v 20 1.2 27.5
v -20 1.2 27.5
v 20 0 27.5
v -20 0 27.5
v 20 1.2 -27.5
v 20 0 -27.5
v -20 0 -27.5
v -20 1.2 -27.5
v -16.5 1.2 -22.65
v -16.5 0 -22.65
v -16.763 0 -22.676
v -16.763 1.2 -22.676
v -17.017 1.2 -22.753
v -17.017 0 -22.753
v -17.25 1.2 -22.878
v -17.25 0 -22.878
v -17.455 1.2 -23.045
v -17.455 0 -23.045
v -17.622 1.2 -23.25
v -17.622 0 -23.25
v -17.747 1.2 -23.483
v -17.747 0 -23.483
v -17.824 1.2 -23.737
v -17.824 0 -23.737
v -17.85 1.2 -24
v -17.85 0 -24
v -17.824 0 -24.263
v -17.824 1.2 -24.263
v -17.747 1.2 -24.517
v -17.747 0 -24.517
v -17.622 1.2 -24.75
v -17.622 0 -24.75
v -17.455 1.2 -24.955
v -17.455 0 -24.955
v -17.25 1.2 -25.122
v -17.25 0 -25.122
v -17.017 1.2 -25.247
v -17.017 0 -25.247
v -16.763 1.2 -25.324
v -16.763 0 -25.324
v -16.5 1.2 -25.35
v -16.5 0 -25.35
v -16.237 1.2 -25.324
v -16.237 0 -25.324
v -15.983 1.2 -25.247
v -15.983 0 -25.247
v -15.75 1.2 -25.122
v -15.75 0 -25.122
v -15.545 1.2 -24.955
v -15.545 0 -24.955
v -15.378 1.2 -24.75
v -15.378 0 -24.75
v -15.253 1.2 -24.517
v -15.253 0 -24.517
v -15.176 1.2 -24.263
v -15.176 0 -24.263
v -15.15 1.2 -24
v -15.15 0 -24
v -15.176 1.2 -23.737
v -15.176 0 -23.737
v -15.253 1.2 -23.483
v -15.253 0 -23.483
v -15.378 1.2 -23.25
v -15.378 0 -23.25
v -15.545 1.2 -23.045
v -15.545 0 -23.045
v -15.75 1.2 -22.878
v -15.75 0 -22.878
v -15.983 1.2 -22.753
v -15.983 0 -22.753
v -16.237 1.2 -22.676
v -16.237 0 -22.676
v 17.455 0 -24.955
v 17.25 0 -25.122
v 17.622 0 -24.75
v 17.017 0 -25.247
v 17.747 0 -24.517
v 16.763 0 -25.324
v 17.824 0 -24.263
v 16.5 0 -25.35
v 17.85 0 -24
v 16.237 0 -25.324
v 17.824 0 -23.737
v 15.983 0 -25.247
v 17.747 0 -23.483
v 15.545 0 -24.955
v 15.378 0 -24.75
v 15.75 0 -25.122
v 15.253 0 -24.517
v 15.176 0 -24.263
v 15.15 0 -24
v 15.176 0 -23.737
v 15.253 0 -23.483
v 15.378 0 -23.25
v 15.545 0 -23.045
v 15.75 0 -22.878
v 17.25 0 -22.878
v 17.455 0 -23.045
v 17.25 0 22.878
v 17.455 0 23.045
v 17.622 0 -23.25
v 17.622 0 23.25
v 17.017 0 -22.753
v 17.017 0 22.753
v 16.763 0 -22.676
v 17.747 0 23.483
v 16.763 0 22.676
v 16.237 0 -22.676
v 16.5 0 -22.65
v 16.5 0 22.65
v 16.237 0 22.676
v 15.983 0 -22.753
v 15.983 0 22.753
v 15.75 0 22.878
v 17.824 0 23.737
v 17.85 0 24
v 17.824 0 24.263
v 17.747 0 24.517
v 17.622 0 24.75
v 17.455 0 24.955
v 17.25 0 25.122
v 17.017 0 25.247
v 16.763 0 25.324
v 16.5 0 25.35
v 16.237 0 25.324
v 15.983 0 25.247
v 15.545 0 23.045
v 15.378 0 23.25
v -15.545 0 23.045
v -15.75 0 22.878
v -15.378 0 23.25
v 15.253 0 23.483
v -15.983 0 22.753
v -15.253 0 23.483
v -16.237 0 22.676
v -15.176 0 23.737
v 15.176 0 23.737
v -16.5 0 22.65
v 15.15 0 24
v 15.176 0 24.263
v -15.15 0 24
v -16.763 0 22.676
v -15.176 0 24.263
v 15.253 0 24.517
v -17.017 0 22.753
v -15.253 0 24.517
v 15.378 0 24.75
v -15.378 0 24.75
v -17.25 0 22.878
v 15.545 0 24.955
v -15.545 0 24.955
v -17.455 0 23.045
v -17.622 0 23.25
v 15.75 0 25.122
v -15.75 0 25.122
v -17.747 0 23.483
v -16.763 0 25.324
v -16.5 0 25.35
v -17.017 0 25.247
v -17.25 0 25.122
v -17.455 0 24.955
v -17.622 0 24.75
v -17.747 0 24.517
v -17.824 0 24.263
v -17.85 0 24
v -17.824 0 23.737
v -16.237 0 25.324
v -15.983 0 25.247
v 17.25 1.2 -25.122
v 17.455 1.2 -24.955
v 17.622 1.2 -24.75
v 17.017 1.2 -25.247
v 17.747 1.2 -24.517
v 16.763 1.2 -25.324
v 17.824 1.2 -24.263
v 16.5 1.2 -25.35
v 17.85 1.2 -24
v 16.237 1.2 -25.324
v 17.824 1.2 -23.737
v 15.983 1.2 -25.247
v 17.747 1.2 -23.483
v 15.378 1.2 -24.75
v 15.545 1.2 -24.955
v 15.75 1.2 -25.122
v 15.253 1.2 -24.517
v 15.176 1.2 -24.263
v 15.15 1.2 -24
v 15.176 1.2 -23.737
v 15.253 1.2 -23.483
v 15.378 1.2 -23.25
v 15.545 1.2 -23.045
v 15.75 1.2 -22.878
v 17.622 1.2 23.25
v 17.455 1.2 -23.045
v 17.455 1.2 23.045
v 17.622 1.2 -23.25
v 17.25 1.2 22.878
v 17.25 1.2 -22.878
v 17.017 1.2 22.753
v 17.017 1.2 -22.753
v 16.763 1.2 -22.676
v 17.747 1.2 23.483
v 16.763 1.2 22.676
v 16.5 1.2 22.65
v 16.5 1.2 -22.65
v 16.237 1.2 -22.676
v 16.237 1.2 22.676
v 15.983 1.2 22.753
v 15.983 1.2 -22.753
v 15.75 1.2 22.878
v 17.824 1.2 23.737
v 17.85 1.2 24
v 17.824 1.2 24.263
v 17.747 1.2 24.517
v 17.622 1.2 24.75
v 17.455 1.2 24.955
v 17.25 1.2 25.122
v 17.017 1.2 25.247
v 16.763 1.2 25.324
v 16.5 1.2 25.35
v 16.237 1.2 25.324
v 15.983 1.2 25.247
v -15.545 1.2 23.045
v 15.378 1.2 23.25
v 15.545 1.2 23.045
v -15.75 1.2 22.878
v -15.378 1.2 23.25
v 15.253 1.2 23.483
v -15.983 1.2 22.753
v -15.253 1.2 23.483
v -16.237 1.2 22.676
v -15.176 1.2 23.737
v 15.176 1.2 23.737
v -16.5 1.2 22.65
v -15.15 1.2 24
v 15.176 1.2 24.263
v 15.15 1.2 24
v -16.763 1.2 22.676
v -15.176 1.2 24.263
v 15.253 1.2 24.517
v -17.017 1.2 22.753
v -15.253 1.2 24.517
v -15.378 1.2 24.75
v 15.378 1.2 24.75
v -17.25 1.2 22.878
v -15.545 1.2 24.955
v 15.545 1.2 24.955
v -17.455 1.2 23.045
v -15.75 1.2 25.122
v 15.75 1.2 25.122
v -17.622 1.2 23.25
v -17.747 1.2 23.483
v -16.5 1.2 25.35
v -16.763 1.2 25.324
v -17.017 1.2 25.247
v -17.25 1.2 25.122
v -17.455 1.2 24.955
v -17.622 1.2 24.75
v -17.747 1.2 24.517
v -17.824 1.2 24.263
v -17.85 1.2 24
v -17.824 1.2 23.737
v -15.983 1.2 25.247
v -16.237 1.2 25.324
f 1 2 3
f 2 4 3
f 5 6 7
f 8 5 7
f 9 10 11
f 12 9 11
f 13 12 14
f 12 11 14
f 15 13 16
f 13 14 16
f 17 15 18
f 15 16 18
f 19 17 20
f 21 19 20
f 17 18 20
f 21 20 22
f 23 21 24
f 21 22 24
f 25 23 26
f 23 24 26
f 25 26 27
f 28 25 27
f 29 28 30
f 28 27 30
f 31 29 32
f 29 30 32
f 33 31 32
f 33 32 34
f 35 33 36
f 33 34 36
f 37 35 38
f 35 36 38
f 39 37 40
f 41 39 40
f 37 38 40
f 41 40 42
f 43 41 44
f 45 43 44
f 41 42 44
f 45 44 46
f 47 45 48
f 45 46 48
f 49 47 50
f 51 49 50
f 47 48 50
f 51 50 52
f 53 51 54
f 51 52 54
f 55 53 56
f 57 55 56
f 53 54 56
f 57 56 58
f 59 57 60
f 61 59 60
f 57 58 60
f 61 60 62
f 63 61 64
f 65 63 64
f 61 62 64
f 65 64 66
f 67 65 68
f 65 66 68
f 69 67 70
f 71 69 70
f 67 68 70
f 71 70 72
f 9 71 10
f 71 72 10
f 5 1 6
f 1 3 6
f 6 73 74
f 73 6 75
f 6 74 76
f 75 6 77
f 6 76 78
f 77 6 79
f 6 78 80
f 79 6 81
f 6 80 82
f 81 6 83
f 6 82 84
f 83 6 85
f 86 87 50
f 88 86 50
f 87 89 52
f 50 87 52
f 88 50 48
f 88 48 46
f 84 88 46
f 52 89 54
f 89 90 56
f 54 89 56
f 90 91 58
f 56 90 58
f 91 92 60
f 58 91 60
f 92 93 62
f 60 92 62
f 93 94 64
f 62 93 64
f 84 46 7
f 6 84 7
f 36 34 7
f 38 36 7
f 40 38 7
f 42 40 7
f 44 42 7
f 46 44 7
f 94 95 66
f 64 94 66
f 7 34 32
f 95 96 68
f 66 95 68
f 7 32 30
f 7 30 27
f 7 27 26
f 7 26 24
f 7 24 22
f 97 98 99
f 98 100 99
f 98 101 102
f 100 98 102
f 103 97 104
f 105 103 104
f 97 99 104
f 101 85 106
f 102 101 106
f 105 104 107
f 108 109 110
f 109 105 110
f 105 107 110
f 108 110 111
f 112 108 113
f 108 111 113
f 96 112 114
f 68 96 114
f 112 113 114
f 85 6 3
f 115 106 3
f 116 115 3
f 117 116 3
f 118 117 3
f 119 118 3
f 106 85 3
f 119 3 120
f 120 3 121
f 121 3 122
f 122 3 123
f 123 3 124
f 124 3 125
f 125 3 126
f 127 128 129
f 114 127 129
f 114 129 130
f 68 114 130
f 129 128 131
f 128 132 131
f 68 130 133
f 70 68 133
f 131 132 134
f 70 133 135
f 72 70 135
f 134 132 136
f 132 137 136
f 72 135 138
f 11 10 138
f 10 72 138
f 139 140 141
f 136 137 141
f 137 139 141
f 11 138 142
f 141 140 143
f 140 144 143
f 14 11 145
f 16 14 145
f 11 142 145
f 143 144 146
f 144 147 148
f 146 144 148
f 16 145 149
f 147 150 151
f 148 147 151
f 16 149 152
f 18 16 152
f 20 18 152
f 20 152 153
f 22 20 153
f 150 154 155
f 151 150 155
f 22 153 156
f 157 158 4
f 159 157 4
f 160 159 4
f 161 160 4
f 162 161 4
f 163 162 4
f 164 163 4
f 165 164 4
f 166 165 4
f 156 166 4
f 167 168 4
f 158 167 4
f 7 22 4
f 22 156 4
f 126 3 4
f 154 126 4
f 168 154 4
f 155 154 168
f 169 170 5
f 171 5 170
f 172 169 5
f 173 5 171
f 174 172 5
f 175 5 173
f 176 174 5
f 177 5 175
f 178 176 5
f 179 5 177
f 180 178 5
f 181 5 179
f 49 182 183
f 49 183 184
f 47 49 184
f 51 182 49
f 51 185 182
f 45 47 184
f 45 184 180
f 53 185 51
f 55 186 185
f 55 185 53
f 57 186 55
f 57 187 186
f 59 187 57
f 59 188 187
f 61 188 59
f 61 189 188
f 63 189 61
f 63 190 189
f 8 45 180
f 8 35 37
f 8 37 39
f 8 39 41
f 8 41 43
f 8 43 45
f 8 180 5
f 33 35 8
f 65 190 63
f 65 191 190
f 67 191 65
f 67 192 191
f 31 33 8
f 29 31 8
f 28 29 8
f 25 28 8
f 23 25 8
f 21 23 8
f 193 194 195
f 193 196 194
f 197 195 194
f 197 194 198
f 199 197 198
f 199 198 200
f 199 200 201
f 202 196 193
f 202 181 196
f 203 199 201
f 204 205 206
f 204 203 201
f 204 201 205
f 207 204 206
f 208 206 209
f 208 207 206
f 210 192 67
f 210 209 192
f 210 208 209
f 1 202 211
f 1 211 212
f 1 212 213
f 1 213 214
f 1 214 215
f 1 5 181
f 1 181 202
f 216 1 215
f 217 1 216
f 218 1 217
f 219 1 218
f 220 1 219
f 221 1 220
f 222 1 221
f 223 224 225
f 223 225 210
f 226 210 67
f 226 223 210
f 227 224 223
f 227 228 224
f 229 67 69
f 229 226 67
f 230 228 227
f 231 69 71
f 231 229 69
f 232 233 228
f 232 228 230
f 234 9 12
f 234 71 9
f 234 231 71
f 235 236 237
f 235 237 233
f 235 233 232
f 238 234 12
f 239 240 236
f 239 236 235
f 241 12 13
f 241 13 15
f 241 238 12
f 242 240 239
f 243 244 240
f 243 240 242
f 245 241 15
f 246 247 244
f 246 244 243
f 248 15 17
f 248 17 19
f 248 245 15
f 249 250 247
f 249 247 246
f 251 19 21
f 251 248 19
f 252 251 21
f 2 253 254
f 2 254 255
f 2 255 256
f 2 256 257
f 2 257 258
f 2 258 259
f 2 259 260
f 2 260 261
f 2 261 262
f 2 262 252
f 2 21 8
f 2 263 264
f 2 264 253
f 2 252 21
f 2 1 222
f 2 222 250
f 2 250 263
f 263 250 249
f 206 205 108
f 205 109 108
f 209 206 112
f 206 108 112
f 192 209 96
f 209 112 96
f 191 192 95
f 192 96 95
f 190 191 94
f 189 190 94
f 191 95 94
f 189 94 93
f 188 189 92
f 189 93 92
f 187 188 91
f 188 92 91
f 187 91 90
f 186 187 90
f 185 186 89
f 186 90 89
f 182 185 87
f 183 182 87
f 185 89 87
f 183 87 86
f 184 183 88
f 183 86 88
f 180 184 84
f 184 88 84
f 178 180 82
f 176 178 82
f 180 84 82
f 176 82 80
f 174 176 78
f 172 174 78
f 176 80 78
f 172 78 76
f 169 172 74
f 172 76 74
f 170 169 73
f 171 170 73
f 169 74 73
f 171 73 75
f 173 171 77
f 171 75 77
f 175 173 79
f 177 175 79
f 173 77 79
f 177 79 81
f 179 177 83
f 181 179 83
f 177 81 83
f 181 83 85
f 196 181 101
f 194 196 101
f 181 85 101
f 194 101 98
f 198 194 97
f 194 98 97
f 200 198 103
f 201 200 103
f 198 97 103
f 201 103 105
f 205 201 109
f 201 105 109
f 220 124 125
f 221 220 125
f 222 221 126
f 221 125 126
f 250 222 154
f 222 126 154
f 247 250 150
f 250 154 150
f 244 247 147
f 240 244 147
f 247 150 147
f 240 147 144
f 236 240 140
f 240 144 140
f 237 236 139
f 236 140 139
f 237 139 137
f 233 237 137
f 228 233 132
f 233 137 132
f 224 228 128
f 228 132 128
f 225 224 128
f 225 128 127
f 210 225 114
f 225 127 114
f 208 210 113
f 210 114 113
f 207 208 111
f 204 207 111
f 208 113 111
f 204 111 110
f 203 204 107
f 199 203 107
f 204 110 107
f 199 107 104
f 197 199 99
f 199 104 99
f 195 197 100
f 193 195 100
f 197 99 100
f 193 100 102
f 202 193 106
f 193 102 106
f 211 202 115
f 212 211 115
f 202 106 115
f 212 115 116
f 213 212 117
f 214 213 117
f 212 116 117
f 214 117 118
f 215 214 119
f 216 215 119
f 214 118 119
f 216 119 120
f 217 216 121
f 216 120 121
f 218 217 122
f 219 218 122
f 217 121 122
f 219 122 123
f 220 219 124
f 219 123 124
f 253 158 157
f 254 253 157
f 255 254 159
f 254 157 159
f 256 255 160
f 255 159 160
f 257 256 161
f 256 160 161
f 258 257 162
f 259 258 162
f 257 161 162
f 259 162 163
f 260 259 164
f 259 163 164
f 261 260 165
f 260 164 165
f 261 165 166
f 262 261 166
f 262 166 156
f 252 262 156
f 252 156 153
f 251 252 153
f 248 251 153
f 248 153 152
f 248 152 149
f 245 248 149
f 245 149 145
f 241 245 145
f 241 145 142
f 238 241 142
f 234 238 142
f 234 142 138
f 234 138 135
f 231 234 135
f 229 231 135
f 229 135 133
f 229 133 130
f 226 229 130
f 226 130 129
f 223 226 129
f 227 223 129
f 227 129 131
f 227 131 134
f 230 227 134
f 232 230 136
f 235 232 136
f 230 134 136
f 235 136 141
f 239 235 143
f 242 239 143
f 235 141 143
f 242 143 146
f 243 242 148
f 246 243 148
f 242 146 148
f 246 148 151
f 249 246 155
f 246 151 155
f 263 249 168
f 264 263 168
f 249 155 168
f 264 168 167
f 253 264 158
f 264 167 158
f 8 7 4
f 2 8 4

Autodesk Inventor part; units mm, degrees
ref_plane "YZ Plane" through (0, 0, 0) normal (1, 0, 0) x (0, 1, 0)
ref_plane "XZ Plane" through (0, 0, 0) normal (0, 1, 0) x (-1, 0, 0)
ref_plane "XY Plane" through (0, 0, 0) normal (0, 0, 1) x (1, 0, 0)
sketch "Sketch1" plane through (0, 0, 0) normal (0, 1, 0) x (-1, 0, 0)
  line L0 (20, 27.5) -> (-20, 27.5)
  line L1 (-20, 27.5) -> (-20, -27.5)
  line L2 (-20, -27.5) -> (20, -27.5)
  line L3 (20, -27.5) -> (20, 27.5)
  point P0 (0, 0)
  point P1 (20, 0)
  point P2 (0, -27.5)
  dimension "d0" = 55
  dimension "d1" = 40
extrude "Extrusion1" add sketch "Sketch1" along normal blind 1.2
sketch "Sketch2" plane through (0, 1.2, 0) normal (0, 1, 0) x (1, 0, 0)
  line L0 (-20, 27.5) -> (-20, -27.5) projected
  line L1 (20, -27.5) -> (20, 27.5) projected
  line L2 (-20, -27.5) -> (20, -27.5) projected
  line L3 (20, 27.5) -> (-20, 27.5) projected
  point P0 (0, 0)
  point P1 (-16.5, -24)
  point P2 (-16.5, 24)
  point P3 (16.5, -24)
  point P4 (16.5, 24)
  dimension "d4" = 3.5
  dimension "d5" = 3.5
  dimension "d6" = 3.5
  dimension "d7" = 3.5
hole "Hole1" at (-16.5, 1.2, 24) at (-16.5, 1.2, -24) at (16.5, 1.2, 24) at (16.5, 1.2, -24) direction (0, -1, 0) diameter 2.7 end through all clearance for "Flat Head Machine Screw" size "M2.5" standard "Ansi Metric M Profile"
properties part number "rpcomputemodule4"
